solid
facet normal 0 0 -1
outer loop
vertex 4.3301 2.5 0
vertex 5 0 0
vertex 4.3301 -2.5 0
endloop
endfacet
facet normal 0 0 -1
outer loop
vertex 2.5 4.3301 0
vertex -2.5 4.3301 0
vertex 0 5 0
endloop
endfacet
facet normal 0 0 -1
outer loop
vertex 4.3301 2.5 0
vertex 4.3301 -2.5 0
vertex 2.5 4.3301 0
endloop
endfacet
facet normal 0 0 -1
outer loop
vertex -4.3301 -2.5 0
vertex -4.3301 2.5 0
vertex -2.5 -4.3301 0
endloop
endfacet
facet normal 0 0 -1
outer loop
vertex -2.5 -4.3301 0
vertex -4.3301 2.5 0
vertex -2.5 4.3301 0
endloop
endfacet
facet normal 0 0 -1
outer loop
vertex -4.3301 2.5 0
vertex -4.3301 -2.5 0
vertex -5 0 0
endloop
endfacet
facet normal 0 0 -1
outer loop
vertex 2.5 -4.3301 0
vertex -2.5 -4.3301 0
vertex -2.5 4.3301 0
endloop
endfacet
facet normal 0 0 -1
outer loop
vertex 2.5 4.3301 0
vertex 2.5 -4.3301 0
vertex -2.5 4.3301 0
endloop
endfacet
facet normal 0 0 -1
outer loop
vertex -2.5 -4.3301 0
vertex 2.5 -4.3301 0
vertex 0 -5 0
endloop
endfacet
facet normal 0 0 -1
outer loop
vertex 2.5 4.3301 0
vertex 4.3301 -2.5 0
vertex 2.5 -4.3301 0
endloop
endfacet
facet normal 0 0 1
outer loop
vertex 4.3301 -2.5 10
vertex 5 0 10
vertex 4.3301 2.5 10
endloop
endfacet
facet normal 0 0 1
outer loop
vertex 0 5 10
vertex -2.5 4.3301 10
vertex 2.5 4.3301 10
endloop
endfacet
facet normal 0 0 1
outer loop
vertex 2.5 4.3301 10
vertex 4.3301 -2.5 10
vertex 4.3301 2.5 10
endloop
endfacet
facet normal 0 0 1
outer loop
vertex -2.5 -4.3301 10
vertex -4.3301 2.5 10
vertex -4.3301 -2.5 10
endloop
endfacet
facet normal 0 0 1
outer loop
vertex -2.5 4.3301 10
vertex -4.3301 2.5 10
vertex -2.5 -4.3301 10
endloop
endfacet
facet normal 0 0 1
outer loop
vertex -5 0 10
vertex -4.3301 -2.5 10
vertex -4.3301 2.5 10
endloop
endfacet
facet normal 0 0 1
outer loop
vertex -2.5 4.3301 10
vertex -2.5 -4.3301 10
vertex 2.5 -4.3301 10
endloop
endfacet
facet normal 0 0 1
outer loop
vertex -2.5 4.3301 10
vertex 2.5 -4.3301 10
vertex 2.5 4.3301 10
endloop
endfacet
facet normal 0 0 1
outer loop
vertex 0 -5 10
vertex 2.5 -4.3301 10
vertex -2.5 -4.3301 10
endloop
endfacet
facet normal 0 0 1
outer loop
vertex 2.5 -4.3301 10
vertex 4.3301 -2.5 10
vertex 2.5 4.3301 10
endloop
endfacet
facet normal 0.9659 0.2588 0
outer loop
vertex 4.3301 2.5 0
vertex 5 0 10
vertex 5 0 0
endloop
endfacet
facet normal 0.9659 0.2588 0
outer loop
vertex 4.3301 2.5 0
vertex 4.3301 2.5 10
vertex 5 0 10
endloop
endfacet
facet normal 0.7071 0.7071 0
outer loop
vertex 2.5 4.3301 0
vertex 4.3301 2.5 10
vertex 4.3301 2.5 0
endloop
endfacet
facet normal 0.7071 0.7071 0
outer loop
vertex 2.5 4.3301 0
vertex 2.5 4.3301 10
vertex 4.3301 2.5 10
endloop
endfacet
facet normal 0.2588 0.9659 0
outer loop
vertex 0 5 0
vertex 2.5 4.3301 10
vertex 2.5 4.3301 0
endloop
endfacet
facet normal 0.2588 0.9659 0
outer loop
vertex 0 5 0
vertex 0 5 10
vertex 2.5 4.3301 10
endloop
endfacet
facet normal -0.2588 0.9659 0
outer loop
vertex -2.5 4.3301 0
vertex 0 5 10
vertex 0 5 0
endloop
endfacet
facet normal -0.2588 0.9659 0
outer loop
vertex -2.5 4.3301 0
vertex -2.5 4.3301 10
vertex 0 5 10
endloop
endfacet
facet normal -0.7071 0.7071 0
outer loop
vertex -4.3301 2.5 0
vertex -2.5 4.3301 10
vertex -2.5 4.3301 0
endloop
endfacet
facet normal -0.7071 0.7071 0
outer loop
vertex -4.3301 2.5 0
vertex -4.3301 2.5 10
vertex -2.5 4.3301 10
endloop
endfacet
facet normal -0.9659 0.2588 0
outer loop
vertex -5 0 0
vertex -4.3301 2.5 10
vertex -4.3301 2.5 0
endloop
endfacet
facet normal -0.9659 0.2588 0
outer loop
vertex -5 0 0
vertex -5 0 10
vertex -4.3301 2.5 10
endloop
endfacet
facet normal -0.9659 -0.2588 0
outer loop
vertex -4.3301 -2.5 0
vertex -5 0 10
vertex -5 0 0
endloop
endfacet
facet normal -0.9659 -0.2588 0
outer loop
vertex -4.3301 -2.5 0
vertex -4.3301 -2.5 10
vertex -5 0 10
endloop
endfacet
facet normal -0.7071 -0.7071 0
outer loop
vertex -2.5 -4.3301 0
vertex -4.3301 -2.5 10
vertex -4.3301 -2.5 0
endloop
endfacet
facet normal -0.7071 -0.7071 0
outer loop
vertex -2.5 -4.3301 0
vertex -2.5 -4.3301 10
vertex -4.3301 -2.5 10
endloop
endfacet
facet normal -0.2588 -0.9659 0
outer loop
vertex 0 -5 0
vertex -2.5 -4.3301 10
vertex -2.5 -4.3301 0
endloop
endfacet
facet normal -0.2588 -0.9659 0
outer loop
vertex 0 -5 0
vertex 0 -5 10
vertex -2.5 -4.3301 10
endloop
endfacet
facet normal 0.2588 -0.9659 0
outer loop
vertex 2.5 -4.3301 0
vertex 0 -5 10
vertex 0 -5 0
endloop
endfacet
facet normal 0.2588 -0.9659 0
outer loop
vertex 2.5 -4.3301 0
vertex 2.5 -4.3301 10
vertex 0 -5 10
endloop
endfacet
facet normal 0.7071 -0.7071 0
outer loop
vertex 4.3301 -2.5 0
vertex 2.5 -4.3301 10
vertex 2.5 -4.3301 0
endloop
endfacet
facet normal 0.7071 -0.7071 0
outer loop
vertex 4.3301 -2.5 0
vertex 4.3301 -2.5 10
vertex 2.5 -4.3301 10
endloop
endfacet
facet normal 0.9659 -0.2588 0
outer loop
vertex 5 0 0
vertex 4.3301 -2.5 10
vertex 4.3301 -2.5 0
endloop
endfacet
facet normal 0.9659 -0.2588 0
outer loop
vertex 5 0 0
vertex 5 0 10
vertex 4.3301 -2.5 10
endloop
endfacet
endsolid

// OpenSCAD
// An outline that already has at least segments= vertices is left
// unchanged: the 12-sided circle keeps its 12 vertices.
linear_extrude(height = 10, segments = 4) circle(r = 5, $fn = 12);
